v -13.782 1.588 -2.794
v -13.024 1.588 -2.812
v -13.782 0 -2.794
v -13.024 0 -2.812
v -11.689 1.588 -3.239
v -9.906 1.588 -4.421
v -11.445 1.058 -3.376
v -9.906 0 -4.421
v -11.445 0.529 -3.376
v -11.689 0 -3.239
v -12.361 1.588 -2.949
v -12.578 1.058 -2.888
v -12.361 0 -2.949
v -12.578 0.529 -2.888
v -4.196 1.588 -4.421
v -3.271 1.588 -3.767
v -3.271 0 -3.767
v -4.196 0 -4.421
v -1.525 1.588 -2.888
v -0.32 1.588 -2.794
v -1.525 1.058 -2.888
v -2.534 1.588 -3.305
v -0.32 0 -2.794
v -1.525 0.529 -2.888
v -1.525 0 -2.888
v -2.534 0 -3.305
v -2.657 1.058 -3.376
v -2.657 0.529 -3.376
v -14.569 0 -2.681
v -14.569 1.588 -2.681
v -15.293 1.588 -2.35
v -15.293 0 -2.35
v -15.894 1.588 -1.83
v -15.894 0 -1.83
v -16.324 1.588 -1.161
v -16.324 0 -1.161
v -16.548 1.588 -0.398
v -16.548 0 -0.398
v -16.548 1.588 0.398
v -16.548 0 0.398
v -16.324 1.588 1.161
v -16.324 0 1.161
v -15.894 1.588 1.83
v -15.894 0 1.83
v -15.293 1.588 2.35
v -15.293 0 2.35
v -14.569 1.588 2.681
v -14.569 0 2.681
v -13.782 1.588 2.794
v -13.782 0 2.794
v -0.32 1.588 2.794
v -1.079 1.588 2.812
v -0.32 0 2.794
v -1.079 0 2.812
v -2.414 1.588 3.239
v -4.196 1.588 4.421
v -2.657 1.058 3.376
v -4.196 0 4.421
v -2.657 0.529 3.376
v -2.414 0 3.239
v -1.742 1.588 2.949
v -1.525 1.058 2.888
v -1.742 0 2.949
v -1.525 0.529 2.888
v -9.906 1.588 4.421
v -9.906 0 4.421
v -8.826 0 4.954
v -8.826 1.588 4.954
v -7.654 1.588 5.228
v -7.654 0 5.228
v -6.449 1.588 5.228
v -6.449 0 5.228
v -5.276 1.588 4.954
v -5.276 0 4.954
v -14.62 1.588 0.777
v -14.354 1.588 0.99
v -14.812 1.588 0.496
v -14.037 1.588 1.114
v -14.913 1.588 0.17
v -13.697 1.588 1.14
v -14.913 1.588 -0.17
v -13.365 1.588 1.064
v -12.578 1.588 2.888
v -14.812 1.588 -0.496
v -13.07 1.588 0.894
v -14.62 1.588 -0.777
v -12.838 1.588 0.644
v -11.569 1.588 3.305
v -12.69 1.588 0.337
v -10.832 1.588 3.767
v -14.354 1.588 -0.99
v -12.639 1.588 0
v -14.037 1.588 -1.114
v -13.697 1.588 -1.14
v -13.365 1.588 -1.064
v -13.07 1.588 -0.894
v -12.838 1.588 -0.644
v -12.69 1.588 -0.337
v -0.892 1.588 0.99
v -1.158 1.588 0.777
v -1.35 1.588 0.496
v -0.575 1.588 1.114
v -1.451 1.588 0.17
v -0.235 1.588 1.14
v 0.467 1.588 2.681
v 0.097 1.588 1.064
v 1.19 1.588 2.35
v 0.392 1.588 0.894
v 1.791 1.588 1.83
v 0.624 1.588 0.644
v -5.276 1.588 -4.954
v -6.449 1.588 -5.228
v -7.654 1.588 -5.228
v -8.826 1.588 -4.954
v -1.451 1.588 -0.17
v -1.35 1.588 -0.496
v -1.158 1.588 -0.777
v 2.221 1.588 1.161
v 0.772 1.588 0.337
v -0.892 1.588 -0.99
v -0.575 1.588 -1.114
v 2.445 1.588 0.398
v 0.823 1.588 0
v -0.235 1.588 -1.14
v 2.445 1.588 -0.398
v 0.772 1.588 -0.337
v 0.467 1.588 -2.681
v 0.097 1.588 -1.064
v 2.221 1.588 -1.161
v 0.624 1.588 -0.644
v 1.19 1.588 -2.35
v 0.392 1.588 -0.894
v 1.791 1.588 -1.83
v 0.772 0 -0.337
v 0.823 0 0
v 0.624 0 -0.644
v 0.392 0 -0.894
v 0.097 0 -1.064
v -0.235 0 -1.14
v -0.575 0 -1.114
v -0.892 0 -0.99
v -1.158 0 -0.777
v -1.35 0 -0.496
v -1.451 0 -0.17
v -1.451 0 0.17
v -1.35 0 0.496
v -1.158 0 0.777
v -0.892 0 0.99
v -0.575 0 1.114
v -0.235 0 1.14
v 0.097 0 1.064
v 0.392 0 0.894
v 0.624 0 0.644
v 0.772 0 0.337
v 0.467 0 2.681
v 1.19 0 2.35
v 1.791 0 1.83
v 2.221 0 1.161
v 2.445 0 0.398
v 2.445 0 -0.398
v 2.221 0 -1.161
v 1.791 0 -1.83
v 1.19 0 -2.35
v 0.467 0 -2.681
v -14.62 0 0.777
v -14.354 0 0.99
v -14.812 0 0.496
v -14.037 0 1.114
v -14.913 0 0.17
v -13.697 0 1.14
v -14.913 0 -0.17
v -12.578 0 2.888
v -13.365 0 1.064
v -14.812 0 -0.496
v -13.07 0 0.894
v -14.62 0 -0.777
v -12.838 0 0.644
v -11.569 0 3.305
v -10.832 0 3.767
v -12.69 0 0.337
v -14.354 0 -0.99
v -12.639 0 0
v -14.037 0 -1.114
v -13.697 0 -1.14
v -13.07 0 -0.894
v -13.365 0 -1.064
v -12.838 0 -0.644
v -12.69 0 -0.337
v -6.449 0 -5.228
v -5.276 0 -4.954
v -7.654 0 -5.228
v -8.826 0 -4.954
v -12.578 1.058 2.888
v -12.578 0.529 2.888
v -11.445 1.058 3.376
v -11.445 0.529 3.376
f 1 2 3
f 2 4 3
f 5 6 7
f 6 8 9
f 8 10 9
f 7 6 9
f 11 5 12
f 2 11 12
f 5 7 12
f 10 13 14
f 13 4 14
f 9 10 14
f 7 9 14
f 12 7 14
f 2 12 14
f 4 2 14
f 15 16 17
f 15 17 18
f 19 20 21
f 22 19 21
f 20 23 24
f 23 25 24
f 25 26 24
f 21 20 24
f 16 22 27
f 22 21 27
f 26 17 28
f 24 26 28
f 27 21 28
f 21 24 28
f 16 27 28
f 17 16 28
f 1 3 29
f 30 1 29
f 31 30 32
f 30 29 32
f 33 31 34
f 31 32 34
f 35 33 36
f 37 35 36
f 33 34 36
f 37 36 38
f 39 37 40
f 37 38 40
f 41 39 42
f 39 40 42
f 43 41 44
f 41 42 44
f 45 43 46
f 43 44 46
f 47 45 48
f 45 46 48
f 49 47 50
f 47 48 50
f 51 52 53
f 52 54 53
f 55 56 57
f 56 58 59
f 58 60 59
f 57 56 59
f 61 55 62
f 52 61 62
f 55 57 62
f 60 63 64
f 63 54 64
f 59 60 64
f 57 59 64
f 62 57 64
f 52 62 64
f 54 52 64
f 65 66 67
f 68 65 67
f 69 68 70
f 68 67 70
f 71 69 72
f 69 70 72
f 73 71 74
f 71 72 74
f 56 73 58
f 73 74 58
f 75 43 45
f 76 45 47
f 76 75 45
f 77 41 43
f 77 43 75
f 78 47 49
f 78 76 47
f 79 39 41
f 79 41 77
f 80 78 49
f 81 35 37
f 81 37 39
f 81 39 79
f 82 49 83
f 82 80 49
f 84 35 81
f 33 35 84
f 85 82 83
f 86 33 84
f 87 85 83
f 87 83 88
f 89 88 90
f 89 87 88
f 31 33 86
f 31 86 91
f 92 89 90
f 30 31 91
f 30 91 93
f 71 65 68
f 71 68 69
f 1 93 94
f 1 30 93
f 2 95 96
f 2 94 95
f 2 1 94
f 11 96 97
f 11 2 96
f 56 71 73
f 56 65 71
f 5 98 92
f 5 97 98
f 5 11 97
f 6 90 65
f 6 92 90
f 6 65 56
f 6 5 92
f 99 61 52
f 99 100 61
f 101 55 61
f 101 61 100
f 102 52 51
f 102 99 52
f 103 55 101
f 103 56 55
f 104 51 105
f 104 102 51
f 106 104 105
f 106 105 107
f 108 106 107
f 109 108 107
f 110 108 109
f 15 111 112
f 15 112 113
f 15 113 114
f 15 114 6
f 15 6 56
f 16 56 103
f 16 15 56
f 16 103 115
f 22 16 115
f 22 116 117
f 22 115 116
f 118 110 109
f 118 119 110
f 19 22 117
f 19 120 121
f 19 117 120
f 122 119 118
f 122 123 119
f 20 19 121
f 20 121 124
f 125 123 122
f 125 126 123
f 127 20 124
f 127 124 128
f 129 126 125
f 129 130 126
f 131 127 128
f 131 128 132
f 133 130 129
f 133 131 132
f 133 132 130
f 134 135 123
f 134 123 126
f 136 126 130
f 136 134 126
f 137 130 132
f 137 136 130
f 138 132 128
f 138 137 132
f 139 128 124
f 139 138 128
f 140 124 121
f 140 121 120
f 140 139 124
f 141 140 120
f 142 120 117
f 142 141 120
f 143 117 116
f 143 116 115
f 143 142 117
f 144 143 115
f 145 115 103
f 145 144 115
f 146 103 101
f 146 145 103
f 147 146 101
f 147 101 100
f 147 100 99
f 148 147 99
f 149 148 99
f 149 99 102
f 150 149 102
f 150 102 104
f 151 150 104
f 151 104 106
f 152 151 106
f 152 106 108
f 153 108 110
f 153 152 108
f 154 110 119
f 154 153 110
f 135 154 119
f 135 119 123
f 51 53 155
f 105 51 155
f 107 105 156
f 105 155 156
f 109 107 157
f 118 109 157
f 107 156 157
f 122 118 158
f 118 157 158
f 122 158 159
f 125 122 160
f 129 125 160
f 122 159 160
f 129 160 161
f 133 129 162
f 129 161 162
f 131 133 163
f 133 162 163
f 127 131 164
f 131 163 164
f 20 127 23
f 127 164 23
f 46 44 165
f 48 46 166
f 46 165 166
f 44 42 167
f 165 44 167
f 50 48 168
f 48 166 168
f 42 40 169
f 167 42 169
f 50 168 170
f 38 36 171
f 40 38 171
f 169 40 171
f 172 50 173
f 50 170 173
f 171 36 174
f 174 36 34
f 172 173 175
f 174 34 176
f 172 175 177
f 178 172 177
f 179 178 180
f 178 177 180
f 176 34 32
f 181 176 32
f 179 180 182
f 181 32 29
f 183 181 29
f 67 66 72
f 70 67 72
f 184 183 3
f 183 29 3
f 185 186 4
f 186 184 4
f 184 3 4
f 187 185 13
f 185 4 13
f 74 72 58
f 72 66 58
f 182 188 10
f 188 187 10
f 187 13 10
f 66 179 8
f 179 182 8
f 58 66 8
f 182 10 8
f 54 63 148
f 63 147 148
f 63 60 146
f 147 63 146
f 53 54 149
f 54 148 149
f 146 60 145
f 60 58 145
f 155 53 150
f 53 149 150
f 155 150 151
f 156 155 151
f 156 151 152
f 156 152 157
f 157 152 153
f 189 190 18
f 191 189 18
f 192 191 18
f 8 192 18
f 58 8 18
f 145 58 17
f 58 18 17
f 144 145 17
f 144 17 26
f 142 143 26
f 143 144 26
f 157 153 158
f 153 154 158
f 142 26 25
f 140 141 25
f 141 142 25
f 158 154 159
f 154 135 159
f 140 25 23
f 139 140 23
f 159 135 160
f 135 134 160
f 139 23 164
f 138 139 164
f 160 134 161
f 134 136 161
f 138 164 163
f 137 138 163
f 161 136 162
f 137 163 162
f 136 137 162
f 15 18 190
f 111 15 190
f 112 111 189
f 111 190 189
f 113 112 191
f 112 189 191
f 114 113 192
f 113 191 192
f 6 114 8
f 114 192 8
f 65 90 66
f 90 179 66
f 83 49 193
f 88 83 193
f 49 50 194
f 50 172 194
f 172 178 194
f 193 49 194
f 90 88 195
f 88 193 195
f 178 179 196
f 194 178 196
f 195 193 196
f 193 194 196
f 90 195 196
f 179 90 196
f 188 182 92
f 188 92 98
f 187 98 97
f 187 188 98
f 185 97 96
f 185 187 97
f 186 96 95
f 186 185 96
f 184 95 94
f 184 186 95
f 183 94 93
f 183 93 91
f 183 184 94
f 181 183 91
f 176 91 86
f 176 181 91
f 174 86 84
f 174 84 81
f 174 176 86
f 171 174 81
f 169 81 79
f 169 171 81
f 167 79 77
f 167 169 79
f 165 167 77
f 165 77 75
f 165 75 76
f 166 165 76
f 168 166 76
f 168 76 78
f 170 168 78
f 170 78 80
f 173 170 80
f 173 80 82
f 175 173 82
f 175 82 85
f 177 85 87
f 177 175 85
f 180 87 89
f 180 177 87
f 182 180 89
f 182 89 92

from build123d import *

# Parameters (mm, degrees)
CROQUIS1_R              = 1.143
SALIENTE_EXTRUIR6_DEPTH = 1.5875


with BuildPart() as part:
    # Croquis1 → Saliente-Extruir6 (new body)
    with BuildSketch(Plane(origin=(0, 0, 0), x_dir=(1, 0, 0), z_dir=(0, 1, 0))):
        with BuildLine():
            ThreePointArc((-13.782319099, 2.794), (-16.576319099, 0), (-13.782319099, -2.794))
            add(Edge.make_bspline(
                [(-13.782319099, -2.794), (-12.381959509, -2.745210856), (-11.808442523, -3.043224941), (-9.906232869, -4.4207888)],
                knots=[0, 0, 0, 0, 1, 1, 1, 1], degree=3))
            ThreePointArc((-9.906232869, -4.4207888), (-7.051319099, -5.2625), (-4.196405329, -4.4207888))
            add(Edge.make_bspline(
                [(-4.196405329, -4.4207888), (-2.294195675, -3.043224941), (-1.720678689, -2.745210856), (-0.320319099, -2.794)],
                knots=[0.921934519, 0.921934519, 0.921934519, 0.921934519, 1.921934519, 1.921934519, 1.921934519, 1.921934519], degree=3))
            ThreePointArc((-0.320319099, -2.794), (2.473680901, 0), (-0.320319099, 2.794))
            add(Edge.make_bspline(
                [(-0.320319099, 2.794), (-1.720678689, 2.745210856), (-2.294195675, 3.043224941), (-4.196405329, 4.4207888)],
                knots=[0, 0, 0, 0, 1, 1, 1, 1], degree=3))
            ThreePointArc((-4.196405329, 4.4207888), (-7.051319099, 5.2625), (-9.906232869, 4.4207888))
            add(Edge.make_bspline(
                [(-9.906232869, 4.4207888), (-11.808442523, 3.043224941), (-12.381959509, 2.745210856), (-13.782319099, 2.794)],
                knots=[0.921934519, 0.921934519, 0.921934519, 0.921934519, 1.921934519, 1.921934519, 1.921934519, 1.921934519], degree=3))
        make_face()
        with Locations((-13.782319099, 0)):
            Circle(CROQUIS1_R, mode=Mode.SUBTRACT)
        with Locations((-0.320319099, 0)):
            Circle(CROQUIS1_R, mode=Mode.SUBTRACT)
    extrude(amount=SALIENTE_EXTRUIR6_DEPTH)


solid = part.part
